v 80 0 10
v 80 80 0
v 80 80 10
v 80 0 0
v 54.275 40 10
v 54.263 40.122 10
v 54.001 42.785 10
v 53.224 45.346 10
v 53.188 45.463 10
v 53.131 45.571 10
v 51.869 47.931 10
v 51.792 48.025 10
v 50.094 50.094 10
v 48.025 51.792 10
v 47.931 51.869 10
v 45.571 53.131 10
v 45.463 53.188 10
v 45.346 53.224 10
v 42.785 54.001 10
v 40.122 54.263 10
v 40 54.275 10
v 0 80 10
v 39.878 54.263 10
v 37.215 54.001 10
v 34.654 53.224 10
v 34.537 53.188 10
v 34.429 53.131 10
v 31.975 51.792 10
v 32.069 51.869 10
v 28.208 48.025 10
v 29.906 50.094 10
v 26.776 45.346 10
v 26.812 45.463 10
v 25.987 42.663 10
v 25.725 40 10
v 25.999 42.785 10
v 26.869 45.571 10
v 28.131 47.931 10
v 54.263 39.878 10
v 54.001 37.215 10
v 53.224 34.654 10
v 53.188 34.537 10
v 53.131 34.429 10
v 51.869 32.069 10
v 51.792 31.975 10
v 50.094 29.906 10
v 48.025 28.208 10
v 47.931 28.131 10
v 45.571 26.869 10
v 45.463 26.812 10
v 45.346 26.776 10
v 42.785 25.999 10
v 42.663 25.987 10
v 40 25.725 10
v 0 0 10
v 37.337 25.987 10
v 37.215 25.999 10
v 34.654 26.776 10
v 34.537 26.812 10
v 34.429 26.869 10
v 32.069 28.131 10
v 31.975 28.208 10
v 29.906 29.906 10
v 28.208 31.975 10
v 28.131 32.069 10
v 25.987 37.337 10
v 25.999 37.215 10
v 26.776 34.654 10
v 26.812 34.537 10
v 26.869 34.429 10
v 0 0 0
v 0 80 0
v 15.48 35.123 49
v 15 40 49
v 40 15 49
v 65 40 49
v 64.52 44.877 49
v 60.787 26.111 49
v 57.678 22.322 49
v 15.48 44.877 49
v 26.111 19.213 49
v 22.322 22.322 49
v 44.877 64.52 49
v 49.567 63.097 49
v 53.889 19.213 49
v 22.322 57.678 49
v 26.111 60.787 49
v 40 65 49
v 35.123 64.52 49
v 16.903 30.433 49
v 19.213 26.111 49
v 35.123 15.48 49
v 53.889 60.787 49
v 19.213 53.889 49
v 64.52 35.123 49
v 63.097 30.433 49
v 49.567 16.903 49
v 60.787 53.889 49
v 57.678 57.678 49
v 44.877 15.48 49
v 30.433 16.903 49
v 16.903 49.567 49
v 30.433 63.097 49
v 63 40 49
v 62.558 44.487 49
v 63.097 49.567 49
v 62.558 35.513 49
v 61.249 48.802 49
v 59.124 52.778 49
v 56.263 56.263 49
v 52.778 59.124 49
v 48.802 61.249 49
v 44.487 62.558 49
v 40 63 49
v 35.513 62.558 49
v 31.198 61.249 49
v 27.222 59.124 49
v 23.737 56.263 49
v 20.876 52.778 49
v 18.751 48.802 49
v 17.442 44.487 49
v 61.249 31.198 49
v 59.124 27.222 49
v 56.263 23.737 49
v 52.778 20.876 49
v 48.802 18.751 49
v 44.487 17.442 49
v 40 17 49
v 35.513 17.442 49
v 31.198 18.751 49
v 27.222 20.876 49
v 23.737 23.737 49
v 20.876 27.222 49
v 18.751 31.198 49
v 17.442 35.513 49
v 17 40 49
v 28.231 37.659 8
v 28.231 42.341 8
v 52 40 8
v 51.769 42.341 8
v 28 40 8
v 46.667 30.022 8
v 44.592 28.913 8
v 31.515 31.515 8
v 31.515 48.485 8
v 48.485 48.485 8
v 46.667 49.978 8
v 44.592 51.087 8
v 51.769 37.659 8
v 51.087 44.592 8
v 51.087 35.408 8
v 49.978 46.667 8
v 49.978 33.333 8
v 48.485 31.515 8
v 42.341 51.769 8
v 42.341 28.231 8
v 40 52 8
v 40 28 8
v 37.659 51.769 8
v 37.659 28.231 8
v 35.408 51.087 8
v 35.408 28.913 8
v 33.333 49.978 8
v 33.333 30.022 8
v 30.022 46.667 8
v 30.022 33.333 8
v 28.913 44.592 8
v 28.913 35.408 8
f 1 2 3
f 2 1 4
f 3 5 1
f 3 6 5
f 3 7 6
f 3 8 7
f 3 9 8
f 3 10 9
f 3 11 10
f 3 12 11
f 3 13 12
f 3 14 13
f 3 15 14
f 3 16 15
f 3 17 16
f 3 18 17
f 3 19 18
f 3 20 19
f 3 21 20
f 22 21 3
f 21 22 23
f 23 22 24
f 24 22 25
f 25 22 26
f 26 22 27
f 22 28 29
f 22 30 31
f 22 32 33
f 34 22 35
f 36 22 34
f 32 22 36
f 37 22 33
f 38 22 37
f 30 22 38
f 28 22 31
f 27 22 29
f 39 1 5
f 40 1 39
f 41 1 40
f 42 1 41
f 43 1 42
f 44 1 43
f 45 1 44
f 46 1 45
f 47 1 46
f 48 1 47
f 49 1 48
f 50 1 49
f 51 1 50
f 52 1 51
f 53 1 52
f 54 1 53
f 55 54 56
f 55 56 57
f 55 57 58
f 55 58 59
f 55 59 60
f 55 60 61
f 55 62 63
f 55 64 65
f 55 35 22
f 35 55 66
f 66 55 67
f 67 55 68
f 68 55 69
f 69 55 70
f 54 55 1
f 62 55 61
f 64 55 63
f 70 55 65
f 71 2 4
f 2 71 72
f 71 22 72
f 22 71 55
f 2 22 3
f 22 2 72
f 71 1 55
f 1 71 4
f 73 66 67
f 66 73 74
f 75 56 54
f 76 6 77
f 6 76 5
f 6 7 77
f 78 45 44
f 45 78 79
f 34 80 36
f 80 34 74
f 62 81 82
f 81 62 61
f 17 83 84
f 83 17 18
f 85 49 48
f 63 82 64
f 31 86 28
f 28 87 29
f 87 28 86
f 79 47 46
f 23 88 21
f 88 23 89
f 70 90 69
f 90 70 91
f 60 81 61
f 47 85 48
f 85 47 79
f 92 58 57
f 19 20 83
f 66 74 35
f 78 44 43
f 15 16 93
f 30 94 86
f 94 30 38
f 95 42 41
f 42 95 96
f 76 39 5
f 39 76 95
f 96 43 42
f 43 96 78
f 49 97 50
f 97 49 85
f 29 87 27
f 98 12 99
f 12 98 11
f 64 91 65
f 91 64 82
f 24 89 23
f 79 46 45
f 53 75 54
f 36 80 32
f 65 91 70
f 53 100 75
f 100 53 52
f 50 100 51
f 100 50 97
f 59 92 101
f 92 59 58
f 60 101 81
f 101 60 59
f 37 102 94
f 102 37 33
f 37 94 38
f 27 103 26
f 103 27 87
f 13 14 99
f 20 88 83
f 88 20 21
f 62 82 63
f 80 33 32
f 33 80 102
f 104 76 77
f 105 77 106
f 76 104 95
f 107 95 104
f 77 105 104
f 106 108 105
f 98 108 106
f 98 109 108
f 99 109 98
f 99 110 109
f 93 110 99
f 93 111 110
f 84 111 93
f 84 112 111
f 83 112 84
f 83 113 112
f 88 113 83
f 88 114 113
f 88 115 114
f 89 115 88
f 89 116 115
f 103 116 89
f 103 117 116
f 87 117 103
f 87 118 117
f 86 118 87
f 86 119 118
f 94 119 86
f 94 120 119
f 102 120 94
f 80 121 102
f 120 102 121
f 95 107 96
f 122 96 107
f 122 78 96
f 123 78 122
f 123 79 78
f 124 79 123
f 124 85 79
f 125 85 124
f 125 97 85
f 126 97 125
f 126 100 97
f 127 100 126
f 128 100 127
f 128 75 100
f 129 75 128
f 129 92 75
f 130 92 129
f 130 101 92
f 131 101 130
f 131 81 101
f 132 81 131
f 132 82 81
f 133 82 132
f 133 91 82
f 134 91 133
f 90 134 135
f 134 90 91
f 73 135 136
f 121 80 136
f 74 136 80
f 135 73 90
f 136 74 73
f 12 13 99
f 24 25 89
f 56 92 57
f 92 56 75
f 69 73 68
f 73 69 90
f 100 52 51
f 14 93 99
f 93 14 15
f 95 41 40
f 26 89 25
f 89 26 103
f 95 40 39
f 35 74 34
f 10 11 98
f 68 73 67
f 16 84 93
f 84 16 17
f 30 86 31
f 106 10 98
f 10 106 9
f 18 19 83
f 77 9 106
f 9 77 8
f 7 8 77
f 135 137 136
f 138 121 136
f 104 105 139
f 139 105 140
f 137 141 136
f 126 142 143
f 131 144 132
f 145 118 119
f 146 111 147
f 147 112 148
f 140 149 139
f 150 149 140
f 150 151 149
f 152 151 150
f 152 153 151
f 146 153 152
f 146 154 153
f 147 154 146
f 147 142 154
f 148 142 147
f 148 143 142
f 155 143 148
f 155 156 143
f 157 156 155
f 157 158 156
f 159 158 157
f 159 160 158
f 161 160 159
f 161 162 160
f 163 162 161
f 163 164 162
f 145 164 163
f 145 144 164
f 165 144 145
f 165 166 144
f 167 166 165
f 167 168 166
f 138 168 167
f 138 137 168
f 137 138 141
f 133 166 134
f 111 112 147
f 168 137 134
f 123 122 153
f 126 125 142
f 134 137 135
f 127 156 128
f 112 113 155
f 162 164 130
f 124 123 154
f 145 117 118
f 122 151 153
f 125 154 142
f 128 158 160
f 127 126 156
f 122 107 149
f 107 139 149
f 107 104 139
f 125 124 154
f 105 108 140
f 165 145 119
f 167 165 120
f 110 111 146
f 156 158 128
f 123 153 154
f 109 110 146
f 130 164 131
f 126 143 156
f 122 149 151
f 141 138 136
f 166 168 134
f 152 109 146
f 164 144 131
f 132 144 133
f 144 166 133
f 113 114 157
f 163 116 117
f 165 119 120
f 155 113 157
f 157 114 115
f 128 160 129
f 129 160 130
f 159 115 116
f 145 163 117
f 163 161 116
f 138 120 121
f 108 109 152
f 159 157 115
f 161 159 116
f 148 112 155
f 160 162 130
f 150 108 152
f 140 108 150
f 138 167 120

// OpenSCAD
$fn = 32;

// ----------------------------------------------------------------------
// Hopper: funnel with square flange
// ----------------------------------------------------------------------

// --- parameters (mm) ---
fl = 80;                  // flange side, X and Y
fl_t = 10;                // flange thickness
cone_h = 40;              // cone height above the flange
top_d = 50;               // cone mouth diameter
bot_d = 28;               // cone spout diameter
wall = 2;                 // cone wall thickness
fit_tol = 0.1;            // tolerance for press fits, mm
free_tol = 0.5;           // tolerance for clearance fits, mm

bore_d = bot_d - 2 * wall;  // spout bore diameter
total_h = fl_t + cone_h - 1;  // overall height

difference() {
  union() {
    cube([fl, fl, fl_t]);
    translate([fl / 2, fl / 2, fl_t - 1])
      cylinder(h = cone_h, d1 = bot_d, d2 = top_d);
  }
  translate([fl / 2, fl / 2, fl_t - 2])
    cylinder(h = cone_h + 1, d1 = bore_d, d2 = top_d - 2 * wall);
}
